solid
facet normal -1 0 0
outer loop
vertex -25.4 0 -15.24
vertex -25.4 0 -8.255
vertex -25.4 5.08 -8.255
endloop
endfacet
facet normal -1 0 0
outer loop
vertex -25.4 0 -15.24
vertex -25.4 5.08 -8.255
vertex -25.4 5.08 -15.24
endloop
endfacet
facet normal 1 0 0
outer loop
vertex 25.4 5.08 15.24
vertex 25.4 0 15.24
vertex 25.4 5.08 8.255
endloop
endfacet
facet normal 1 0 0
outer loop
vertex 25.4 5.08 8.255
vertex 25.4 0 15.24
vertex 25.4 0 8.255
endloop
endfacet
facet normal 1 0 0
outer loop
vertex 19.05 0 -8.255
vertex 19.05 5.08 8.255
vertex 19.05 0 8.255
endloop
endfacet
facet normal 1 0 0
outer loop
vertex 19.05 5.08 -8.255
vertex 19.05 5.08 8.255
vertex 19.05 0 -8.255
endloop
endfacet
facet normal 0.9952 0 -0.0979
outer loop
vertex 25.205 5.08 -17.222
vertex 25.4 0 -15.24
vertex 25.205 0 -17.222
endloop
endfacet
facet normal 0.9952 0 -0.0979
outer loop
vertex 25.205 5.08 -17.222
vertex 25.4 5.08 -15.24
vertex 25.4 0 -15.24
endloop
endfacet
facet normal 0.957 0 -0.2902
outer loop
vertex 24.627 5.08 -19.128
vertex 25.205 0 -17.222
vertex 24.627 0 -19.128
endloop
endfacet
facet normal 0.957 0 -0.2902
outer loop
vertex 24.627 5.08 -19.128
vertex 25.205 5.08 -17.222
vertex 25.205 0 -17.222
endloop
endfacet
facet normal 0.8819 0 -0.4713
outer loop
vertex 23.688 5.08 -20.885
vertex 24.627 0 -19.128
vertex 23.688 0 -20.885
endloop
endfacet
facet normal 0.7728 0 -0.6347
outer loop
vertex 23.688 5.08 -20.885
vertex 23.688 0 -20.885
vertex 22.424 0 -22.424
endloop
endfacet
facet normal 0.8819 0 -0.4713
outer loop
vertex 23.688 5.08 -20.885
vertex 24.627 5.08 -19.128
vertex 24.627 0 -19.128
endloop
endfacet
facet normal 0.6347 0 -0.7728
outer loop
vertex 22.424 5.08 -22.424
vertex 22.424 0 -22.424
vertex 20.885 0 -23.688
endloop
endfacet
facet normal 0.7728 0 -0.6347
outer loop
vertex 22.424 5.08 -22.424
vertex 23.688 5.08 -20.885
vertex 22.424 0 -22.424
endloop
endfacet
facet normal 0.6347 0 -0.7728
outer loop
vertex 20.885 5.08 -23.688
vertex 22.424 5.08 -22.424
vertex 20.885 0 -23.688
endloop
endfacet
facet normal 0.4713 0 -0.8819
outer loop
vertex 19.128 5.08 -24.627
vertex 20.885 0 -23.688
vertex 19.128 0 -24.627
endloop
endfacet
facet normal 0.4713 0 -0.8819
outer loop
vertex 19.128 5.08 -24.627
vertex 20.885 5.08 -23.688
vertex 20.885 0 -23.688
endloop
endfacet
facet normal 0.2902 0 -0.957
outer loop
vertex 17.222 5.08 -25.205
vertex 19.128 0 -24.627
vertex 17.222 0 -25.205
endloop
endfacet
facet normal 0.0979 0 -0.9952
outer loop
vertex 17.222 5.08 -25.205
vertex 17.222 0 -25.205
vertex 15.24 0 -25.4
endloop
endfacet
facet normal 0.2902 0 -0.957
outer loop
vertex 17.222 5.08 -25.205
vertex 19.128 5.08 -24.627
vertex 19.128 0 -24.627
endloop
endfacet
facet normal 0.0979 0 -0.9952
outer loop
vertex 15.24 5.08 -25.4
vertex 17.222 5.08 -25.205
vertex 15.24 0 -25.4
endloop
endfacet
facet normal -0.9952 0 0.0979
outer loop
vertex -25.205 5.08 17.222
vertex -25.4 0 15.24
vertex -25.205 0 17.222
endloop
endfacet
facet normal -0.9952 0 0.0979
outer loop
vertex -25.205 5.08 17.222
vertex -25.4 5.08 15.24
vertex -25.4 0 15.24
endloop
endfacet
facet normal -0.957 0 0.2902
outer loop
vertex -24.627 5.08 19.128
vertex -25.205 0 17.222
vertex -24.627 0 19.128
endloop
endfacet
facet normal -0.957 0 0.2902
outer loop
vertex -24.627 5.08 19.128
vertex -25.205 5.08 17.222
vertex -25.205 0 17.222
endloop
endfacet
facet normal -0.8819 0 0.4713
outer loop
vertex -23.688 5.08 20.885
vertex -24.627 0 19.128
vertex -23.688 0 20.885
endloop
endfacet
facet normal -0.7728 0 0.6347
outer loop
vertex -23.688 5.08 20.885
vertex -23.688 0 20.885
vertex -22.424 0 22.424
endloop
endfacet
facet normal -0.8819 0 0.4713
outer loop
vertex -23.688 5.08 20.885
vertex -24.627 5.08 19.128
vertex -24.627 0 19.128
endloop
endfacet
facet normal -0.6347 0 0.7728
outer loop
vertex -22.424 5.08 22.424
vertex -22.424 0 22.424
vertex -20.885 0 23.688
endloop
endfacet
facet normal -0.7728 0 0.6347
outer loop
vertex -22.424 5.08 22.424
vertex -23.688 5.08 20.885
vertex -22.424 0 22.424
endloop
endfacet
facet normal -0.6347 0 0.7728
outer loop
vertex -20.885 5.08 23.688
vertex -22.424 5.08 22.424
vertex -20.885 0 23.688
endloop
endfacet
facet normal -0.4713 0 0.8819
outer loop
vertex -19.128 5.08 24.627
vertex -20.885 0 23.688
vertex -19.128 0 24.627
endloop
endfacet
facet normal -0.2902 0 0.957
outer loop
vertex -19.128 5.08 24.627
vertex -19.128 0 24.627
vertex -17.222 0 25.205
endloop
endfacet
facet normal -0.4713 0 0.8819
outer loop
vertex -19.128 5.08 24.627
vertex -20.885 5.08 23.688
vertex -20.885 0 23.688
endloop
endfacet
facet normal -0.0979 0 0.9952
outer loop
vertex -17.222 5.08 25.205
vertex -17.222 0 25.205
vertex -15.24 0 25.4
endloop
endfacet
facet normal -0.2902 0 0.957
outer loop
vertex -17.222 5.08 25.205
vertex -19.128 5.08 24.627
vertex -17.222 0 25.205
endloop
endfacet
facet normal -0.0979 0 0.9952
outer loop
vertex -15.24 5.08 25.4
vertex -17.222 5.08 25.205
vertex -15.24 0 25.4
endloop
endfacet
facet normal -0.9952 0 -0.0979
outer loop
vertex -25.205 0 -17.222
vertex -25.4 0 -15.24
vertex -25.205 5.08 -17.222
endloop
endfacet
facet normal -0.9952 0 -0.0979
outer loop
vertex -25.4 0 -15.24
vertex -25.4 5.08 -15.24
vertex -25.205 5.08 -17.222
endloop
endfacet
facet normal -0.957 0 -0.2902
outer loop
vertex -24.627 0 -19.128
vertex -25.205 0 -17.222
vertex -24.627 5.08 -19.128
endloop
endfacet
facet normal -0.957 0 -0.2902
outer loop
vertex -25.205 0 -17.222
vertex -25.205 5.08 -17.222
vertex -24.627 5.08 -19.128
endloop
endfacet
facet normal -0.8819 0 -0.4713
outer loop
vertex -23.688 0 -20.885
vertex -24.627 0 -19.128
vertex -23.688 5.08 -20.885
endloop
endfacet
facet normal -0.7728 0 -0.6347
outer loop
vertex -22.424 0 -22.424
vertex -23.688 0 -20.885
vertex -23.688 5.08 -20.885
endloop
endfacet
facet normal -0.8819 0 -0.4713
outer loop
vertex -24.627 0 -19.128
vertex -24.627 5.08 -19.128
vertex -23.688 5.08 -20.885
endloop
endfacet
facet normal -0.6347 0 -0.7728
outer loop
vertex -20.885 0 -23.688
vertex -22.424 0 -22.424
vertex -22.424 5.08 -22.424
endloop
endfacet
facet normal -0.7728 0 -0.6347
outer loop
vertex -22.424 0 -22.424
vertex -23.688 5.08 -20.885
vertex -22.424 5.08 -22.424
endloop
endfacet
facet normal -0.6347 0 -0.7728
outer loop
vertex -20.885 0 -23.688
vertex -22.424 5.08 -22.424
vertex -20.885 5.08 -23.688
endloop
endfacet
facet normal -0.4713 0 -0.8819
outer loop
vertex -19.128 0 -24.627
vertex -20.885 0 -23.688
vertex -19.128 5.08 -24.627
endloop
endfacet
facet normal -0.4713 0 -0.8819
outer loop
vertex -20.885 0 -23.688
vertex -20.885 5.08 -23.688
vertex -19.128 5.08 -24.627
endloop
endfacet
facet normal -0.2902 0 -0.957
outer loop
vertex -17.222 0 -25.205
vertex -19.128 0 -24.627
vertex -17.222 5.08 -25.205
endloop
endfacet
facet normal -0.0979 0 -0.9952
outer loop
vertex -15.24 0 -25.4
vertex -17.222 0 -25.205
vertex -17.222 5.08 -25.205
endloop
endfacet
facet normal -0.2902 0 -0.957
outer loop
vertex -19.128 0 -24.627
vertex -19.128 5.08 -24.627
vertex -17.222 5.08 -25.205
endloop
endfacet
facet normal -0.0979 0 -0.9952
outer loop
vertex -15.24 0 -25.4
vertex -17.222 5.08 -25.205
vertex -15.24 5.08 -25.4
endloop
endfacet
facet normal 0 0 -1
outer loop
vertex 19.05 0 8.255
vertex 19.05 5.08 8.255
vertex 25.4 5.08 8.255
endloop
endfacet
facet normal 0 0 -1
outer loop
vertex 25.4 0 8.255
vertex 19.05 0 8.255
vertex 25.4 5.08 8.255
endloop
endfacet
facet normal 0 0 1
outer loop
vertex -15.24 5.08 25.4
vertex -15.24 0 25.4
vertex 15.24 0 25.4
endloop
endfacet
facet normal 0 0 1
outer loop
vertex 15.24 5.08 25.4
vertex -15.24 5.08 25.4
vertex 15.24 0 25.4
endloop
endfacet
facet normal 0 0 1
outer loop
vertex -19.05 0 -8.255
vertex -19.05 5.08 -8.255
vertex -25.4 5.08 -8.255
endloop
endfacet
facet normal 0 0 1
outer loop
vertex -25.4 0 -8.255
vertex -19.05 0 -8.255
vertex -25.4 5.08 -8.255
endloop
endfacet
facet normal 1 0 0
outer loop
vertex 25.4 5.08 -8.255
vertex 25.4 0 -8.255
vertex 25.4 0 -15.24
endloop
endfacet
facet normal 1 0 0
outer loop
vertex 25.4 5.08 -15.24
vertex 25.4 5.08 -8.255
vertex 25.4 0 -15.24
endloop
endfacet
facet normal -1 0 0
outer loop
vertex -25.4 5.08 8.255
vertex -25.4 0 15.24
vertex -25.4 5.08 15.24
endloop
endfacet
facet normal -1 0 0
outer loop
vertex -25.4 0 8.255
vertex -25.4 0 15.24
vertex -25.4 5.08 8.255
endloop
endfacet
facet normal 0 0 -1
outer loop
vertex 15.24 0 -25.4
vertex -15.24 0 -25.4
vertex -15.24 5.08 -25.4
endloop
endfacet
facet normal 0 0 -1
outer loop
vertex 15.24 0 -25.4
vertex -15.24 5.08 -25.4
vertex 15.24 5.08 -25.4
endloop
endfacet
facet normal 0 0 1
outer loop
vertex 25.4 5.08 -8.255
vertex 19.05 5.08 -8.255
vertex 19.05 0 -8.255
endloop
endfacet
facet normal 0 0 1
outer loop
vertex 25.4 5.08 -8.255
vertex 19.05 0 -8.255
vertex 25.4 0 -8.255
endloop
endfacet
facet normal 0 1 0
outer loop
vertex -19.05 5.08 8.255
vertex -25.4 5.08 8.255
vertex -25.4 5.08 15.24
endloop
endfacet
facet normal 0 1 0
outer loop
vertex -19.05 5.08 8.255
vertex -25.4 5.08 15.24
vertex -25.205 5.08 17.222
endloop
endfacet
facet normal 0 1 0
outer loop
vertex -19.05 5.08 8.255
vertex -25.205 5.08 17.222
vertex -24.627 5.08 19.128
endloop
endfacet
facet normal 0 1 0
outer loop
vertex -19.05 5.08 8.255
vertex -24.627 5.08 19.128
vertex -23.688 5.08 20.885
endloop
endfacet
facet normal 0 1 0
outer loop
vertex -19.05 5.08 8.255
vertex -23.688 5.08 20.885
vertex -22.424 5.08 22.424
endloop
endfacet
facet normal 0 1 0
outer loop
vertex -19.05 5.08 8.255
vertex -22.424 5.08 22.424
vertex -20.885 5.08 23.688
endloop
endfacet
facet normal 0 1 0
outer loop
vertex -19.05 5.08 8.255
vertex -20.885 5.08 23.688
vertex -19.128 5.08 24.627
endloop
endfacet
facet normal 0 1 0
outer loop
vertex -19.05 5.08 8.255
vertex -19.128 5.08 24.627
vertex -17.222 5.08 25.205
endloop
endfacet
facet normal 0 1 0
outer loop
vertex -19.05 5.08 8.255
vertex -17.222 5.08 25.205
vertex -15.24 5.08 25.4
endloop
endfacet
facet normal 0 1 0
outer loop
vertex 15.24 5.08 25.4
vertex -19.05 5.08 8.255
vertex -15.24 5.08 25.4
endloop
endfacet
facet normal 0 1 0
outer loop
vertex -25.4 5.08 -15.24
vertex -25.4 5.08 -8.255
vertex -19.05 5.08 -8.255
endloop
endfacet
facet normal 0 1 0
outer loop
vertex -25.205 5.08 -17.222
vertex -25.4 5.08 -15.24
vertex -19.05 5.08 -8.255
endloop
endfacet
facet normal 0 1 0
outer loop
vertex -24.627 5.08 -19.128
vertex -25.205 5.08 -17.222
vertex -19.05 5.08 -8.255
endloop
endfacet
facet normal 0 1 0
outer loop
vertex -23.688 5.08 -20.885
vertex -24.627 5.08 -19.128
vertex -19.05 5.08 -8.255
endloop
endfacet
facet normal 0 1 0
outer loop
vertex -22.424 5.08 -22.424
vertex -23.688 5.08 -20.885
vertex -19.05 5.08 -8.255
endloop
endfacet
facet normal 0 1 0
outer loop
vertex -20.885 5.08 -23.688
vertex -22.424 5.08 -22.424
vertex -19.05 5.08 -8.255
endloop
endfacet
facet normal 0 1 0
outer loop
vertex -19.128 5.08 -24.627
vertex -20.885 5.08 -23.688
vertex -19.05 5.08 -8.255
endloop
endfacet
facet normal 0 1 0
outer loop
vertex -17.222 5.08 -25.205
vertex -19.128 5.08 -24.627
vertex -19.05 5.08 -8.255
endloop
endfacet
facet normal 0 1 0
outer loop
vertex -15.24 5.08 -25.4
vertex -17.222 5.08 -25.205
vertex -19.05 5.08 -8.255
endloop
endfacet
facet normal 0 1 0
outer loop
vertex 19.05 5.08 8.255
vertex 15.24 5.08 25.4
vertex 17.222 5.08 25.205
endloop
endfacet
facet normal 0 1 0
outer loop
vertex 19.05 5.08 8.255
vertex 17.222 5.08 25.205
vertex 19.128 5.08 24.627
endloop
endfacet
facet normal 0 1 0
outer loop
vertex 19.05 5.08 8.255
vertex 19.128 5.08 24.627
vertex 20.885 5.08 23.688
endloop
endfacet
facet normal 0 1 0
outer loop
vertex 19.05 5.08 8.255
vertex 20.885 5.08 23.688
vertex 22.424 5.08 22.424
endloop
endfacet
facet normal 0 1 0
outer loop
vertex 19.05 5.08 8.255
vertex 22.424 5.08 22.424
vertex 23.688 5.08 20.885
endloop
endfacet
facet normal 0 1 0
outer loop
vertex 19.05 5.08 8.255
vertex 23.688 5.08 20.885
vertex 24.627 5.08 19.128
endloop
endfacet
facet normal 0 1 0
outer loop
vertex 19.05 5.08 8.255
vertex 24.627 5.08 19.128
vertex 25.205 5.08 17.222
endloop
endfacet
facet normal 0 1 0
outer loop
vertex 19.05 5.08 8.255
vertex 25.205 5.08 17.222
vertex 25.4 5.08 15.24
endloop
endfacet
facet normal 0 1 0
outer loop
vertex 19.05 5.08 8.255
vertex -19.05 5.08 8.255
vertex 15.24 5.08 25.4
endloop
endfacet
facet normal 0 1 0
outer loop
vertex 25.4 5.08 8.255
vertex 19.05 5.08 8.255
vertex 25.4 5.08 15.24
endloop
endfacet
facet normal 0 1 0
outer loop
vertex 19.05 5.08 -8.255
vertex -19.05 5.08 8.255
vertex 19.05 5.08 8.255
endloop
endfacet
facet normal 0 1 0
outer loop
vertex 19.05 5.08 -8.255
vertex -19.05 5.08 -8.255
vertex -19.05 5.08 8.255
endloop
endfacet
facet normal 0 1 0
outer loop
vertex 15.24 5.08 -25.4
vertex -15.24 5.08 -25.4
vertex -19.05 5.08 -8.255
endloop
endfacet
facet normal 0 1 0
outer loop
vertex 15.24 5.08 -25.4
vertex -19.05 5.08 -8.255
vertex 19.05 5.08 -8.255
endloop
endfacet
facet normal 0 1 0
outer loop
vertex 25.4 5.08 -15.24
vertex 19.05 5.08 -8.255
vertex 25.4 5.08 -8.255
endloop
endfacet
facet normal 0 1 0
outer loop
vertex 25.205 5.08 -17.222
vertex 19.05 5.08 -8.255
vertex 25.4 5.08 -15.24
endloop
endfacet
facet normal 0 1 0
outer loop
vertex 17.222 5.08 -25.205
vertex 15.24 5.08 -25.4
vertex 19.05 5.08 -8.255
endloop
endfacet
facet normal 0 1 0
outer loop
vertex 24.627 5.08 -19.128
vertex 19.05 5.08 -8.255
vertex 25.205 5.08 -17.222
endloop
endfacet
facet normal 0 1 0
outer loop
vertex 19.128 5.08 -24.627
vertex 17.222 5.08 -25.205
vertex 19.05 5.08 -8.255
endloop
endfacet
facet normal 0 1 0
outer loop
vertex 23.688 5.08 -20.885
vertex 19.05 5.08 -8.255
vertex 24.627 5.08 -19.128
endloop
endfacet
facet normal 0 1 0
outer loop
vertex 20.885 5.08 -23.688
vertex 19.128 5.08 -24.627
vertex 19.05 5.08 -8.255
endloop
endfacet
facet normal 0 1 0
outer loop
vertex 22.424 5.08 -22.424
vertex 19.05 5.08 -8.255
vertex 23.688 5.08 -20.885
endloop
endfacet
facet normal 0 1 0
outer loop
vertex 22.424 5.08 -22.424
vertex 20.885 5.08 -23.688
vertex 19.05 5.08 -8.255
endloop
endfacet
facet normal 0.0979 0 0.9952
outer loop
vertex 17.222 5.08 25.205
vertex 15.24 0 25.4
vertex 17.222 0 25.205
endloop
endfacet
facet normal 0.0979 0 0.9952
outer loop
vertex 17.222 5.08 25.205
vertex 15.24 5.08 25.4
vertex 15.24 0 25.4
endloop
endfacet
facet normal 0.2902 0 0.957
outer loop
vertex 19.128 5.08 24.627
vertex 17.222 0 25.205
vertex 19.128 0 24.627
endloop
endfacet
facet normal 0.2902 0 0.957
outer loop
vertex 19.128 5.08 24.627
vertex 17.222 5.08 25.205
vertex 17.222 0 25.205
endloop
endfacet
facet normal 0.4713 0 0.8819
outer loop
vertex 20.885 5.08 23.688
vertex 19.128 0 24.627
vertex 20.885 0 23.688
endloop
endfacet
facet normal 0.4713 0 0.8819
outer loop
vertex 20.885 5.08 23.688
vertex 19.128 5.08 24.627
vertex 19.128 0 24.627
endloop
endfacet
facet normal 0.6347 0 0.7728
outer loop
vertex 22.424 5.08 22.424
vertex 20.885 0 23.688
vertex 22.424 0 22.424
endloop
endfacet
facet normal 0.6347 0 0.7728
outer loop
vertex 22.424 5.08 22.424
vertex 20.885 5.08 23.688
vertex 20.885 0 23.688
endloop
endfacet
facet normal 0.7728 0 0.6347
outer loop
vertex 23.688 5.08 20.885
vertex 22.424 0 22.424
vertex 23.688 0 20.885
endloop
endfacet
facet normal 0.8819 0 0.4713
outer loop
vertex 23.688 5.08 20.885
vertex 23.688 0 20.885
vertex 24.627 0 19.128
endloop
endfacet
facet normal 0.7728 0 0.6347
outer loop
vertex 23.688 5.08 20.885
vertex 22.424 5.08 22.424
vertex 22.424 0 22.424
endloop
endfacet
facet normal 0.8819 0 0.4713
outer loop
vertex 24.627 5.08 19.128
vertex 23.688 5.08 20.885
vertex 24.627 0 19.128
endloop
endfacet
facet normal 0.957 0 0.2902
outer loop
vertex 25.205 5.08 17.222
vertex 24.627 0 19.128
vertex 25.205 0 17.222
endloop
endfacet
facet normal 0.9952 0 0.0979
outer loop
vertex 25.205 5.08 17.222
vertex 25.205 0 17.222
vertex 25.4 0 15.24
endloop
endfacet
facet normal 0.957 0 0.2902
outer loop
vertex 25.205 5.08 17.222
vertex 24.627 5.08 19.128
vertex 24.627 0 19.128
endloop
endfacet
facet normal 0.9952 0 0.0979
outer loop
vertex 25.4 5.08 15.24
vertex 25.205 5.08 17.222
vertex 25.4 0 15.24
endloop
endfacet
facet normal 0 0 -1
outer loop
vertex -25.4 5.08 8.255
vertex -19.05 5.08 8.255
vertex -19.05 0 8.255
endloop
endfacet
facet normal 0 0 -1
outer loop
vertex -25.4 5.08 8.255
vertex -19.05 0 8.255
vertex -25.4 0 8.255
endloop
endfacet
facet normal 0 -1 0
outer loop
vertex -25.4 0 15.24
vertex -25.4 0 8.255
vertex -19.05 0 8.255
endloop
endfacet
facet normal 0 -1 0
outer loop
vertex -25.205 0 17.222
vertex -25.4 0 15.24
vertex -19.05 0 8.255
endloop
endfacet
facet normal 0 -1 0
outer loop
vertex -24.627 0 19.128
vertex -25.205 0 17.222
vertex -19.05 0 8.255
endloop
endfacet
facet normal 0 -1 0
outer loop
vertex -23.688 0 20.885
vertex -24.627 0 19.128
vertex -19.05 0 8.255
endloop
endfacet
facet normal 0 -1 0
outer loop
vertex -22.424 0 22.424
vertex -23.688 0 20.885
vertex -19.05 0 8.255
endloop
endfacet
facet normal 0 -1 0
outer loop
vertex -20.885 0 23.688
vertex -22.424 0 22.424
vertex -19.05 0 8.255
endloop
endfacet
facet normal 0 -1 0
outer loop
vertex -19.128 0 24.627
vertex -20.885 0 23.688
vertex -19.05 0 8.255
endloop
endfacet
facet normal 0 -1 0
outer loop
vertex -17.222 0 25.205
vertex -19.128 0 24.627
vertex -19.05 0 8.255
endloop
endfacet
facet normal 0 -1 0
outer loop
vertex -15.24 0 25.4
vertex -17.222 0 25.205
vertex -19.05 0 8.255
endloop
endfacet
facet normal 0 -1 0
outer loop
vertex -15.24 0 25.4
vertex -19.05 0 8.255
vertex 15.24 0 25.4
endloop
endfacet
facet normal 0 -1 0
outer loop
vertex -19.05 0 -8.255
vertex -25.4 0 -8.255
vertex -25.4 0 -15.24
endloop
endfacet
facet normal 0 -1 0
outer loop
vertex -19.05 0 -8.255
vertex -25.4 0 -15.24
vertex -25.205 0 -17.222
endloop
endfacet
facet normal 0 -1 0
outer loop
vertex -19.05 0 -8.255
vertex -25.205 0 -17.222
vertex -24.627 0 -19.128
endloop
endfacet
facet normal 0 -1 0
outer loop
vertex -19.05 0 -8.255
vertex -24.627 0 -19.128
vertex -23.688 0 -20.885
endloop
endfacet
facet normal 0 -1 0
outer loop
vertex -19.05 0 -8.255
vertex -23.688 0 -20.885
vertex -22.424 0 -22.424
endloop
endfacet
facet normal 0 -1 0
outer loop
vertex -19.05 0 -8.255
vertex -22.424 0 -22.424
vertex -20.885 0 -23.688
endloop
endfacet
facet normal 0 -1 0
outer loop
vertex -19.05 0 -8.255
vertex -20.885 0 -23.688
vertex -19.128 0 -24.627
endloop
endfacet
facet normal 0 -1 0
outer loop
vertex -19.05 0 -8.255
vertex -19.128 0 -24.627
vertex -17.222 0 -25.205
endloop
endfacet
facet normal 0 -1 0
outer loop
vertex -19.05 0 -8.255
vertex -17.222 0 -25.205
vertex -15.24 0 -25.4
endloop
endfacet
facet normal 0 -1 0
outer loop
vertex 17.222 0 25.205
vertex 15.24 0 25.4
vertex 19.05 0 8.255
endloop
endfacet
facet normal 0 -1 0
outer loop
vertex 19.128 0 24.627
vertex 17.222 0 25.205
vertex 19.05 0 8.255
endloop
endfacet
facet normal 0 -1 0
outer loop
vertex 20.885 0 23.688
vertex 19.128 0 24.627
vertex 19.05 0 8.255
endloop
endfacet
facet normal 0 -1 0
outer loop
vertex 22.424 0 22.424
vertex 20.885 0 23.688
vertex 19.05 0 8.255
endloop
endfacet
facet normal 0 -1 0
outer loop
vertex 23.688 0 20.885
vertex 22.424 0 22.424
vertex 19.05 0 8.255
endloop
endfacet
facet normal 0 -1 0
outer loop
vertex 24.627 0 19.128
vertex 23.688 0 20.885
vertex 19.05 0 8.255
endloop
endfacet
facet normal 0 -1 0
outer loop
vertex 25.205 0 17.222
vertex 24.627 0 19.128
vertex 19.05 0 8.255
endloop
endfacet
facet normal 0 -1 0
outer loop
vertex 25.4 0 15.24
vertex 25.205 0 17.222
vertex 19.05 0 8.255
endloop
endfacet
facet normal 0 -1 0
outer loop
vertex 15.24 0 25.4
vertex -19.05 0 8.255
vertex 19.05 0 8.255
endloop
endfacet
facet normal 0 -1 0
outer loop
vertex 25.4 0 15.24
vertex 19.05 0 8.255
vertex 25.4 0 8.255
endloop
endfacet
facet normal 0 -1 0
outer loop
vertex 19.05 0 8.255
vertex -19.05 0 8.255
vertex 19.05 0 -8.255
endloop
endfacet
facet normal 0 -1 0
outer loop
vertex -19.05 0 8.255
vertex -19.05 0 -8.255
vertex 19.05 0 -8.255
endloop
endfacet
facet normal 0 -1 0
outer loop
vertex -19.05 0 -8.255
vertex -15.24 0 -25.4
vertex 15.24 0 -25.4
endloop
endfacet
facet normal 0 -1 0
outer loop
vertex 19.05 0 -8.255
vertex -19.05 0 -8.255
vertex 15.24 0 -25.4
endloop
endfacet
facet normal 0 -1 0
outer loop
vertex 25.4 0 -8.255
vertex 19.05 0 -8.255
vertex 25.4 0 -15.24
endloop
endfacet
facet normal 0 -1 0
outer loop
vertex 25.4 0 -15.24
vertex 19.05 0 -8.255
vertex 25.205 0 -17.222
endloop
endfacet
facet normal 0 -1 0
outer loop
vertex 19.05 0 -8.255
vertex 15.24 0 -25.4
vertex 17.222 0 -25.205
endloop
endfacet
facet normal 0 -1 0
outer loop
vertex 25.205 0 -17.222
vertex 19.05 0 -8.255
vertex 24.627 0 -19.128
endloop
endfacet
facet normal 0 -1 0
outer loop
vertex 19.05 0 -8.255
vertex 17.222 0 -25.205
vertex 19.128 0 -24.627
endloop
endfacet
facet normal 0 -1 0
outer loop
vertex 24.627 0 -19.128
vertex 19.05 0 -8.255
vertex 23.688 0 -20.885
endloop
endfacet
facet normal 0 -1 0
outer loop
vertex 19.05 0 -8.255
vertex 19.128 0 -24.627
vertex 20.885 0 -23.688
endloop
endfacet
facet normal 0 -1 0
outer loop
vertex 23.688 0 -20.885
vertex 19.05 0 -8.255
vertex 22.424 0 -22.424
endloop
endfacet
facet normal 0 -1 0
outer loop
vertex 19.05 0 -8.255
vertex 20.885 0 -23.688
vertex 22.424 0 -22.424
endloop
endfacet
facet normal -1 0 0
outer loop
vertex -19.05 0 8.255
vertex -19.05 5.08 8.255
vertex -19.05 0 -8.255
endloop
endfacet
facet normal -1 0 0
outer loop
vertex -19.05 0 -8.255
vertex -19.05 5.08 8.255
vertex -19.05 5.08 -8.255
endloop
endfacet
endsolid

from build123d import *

# Parameters (mm, degrees)
SKETCH1_W           = 50.8
SKETCH1_H           = 50.8
BOSS_EXTRUDE1_DEPTH = 5.08
FILLET1_R           = 10.16
SKETCH2_W           = 6.35
SKETCH2_H           = 16.51
CUT_EXTRUDE1_DEPTH  = 5.08


with BuildPart() as part:
    # Sketch1 → Boss-Extrude1 (new body)
    with BuildSketch(Plane(origin=(0, 0, 0), x_dir=(1, 0, 0), z_dir=(0, 1, 0))):
        Rectangle(SKETCH1_W, SKETCH1_H)
    extrude(amount=BOSS_EXTRUDE1_DEPTH)

    # Fillet1
    fillet1_edges = [part.edges().sort_by_distance(p)[0] for p in [
        (25.4, 2.54, 25.4),
        (-25.4, 2.54, 25.4),
        (-25.4, 2.54, -25.4),
        (25.4, 2.54, -25.4),
    ]]
    fillet(fillet1_edges, radius=FILLET1_R)

    # Sketch2 → Cut-Extrude1 (cut)
    with BuildSketch(Plane(origin=(0, 5.08, 0), x_dir=(1, 0, 0), z_dir=(0, 1, 0))):
        with Locations((22.225, 0)):
            Rectangle(SKETCH2_W, SKETCH2_H)
    cut_extrude1 = extrude(amount=-CUT_EXTRUDE1_DEPTH, mode=Mode.SUBTRACT)

    # Mirror1: Cut-Extrude1 across plane
    add(cut_extrude1.mirror(Plane(origin=(0, 0, 0), x_dir=(0, 0, 1), z_dir=(1, 0, 0))), mode=Mode.SUBTRACT)


solid = part.part
